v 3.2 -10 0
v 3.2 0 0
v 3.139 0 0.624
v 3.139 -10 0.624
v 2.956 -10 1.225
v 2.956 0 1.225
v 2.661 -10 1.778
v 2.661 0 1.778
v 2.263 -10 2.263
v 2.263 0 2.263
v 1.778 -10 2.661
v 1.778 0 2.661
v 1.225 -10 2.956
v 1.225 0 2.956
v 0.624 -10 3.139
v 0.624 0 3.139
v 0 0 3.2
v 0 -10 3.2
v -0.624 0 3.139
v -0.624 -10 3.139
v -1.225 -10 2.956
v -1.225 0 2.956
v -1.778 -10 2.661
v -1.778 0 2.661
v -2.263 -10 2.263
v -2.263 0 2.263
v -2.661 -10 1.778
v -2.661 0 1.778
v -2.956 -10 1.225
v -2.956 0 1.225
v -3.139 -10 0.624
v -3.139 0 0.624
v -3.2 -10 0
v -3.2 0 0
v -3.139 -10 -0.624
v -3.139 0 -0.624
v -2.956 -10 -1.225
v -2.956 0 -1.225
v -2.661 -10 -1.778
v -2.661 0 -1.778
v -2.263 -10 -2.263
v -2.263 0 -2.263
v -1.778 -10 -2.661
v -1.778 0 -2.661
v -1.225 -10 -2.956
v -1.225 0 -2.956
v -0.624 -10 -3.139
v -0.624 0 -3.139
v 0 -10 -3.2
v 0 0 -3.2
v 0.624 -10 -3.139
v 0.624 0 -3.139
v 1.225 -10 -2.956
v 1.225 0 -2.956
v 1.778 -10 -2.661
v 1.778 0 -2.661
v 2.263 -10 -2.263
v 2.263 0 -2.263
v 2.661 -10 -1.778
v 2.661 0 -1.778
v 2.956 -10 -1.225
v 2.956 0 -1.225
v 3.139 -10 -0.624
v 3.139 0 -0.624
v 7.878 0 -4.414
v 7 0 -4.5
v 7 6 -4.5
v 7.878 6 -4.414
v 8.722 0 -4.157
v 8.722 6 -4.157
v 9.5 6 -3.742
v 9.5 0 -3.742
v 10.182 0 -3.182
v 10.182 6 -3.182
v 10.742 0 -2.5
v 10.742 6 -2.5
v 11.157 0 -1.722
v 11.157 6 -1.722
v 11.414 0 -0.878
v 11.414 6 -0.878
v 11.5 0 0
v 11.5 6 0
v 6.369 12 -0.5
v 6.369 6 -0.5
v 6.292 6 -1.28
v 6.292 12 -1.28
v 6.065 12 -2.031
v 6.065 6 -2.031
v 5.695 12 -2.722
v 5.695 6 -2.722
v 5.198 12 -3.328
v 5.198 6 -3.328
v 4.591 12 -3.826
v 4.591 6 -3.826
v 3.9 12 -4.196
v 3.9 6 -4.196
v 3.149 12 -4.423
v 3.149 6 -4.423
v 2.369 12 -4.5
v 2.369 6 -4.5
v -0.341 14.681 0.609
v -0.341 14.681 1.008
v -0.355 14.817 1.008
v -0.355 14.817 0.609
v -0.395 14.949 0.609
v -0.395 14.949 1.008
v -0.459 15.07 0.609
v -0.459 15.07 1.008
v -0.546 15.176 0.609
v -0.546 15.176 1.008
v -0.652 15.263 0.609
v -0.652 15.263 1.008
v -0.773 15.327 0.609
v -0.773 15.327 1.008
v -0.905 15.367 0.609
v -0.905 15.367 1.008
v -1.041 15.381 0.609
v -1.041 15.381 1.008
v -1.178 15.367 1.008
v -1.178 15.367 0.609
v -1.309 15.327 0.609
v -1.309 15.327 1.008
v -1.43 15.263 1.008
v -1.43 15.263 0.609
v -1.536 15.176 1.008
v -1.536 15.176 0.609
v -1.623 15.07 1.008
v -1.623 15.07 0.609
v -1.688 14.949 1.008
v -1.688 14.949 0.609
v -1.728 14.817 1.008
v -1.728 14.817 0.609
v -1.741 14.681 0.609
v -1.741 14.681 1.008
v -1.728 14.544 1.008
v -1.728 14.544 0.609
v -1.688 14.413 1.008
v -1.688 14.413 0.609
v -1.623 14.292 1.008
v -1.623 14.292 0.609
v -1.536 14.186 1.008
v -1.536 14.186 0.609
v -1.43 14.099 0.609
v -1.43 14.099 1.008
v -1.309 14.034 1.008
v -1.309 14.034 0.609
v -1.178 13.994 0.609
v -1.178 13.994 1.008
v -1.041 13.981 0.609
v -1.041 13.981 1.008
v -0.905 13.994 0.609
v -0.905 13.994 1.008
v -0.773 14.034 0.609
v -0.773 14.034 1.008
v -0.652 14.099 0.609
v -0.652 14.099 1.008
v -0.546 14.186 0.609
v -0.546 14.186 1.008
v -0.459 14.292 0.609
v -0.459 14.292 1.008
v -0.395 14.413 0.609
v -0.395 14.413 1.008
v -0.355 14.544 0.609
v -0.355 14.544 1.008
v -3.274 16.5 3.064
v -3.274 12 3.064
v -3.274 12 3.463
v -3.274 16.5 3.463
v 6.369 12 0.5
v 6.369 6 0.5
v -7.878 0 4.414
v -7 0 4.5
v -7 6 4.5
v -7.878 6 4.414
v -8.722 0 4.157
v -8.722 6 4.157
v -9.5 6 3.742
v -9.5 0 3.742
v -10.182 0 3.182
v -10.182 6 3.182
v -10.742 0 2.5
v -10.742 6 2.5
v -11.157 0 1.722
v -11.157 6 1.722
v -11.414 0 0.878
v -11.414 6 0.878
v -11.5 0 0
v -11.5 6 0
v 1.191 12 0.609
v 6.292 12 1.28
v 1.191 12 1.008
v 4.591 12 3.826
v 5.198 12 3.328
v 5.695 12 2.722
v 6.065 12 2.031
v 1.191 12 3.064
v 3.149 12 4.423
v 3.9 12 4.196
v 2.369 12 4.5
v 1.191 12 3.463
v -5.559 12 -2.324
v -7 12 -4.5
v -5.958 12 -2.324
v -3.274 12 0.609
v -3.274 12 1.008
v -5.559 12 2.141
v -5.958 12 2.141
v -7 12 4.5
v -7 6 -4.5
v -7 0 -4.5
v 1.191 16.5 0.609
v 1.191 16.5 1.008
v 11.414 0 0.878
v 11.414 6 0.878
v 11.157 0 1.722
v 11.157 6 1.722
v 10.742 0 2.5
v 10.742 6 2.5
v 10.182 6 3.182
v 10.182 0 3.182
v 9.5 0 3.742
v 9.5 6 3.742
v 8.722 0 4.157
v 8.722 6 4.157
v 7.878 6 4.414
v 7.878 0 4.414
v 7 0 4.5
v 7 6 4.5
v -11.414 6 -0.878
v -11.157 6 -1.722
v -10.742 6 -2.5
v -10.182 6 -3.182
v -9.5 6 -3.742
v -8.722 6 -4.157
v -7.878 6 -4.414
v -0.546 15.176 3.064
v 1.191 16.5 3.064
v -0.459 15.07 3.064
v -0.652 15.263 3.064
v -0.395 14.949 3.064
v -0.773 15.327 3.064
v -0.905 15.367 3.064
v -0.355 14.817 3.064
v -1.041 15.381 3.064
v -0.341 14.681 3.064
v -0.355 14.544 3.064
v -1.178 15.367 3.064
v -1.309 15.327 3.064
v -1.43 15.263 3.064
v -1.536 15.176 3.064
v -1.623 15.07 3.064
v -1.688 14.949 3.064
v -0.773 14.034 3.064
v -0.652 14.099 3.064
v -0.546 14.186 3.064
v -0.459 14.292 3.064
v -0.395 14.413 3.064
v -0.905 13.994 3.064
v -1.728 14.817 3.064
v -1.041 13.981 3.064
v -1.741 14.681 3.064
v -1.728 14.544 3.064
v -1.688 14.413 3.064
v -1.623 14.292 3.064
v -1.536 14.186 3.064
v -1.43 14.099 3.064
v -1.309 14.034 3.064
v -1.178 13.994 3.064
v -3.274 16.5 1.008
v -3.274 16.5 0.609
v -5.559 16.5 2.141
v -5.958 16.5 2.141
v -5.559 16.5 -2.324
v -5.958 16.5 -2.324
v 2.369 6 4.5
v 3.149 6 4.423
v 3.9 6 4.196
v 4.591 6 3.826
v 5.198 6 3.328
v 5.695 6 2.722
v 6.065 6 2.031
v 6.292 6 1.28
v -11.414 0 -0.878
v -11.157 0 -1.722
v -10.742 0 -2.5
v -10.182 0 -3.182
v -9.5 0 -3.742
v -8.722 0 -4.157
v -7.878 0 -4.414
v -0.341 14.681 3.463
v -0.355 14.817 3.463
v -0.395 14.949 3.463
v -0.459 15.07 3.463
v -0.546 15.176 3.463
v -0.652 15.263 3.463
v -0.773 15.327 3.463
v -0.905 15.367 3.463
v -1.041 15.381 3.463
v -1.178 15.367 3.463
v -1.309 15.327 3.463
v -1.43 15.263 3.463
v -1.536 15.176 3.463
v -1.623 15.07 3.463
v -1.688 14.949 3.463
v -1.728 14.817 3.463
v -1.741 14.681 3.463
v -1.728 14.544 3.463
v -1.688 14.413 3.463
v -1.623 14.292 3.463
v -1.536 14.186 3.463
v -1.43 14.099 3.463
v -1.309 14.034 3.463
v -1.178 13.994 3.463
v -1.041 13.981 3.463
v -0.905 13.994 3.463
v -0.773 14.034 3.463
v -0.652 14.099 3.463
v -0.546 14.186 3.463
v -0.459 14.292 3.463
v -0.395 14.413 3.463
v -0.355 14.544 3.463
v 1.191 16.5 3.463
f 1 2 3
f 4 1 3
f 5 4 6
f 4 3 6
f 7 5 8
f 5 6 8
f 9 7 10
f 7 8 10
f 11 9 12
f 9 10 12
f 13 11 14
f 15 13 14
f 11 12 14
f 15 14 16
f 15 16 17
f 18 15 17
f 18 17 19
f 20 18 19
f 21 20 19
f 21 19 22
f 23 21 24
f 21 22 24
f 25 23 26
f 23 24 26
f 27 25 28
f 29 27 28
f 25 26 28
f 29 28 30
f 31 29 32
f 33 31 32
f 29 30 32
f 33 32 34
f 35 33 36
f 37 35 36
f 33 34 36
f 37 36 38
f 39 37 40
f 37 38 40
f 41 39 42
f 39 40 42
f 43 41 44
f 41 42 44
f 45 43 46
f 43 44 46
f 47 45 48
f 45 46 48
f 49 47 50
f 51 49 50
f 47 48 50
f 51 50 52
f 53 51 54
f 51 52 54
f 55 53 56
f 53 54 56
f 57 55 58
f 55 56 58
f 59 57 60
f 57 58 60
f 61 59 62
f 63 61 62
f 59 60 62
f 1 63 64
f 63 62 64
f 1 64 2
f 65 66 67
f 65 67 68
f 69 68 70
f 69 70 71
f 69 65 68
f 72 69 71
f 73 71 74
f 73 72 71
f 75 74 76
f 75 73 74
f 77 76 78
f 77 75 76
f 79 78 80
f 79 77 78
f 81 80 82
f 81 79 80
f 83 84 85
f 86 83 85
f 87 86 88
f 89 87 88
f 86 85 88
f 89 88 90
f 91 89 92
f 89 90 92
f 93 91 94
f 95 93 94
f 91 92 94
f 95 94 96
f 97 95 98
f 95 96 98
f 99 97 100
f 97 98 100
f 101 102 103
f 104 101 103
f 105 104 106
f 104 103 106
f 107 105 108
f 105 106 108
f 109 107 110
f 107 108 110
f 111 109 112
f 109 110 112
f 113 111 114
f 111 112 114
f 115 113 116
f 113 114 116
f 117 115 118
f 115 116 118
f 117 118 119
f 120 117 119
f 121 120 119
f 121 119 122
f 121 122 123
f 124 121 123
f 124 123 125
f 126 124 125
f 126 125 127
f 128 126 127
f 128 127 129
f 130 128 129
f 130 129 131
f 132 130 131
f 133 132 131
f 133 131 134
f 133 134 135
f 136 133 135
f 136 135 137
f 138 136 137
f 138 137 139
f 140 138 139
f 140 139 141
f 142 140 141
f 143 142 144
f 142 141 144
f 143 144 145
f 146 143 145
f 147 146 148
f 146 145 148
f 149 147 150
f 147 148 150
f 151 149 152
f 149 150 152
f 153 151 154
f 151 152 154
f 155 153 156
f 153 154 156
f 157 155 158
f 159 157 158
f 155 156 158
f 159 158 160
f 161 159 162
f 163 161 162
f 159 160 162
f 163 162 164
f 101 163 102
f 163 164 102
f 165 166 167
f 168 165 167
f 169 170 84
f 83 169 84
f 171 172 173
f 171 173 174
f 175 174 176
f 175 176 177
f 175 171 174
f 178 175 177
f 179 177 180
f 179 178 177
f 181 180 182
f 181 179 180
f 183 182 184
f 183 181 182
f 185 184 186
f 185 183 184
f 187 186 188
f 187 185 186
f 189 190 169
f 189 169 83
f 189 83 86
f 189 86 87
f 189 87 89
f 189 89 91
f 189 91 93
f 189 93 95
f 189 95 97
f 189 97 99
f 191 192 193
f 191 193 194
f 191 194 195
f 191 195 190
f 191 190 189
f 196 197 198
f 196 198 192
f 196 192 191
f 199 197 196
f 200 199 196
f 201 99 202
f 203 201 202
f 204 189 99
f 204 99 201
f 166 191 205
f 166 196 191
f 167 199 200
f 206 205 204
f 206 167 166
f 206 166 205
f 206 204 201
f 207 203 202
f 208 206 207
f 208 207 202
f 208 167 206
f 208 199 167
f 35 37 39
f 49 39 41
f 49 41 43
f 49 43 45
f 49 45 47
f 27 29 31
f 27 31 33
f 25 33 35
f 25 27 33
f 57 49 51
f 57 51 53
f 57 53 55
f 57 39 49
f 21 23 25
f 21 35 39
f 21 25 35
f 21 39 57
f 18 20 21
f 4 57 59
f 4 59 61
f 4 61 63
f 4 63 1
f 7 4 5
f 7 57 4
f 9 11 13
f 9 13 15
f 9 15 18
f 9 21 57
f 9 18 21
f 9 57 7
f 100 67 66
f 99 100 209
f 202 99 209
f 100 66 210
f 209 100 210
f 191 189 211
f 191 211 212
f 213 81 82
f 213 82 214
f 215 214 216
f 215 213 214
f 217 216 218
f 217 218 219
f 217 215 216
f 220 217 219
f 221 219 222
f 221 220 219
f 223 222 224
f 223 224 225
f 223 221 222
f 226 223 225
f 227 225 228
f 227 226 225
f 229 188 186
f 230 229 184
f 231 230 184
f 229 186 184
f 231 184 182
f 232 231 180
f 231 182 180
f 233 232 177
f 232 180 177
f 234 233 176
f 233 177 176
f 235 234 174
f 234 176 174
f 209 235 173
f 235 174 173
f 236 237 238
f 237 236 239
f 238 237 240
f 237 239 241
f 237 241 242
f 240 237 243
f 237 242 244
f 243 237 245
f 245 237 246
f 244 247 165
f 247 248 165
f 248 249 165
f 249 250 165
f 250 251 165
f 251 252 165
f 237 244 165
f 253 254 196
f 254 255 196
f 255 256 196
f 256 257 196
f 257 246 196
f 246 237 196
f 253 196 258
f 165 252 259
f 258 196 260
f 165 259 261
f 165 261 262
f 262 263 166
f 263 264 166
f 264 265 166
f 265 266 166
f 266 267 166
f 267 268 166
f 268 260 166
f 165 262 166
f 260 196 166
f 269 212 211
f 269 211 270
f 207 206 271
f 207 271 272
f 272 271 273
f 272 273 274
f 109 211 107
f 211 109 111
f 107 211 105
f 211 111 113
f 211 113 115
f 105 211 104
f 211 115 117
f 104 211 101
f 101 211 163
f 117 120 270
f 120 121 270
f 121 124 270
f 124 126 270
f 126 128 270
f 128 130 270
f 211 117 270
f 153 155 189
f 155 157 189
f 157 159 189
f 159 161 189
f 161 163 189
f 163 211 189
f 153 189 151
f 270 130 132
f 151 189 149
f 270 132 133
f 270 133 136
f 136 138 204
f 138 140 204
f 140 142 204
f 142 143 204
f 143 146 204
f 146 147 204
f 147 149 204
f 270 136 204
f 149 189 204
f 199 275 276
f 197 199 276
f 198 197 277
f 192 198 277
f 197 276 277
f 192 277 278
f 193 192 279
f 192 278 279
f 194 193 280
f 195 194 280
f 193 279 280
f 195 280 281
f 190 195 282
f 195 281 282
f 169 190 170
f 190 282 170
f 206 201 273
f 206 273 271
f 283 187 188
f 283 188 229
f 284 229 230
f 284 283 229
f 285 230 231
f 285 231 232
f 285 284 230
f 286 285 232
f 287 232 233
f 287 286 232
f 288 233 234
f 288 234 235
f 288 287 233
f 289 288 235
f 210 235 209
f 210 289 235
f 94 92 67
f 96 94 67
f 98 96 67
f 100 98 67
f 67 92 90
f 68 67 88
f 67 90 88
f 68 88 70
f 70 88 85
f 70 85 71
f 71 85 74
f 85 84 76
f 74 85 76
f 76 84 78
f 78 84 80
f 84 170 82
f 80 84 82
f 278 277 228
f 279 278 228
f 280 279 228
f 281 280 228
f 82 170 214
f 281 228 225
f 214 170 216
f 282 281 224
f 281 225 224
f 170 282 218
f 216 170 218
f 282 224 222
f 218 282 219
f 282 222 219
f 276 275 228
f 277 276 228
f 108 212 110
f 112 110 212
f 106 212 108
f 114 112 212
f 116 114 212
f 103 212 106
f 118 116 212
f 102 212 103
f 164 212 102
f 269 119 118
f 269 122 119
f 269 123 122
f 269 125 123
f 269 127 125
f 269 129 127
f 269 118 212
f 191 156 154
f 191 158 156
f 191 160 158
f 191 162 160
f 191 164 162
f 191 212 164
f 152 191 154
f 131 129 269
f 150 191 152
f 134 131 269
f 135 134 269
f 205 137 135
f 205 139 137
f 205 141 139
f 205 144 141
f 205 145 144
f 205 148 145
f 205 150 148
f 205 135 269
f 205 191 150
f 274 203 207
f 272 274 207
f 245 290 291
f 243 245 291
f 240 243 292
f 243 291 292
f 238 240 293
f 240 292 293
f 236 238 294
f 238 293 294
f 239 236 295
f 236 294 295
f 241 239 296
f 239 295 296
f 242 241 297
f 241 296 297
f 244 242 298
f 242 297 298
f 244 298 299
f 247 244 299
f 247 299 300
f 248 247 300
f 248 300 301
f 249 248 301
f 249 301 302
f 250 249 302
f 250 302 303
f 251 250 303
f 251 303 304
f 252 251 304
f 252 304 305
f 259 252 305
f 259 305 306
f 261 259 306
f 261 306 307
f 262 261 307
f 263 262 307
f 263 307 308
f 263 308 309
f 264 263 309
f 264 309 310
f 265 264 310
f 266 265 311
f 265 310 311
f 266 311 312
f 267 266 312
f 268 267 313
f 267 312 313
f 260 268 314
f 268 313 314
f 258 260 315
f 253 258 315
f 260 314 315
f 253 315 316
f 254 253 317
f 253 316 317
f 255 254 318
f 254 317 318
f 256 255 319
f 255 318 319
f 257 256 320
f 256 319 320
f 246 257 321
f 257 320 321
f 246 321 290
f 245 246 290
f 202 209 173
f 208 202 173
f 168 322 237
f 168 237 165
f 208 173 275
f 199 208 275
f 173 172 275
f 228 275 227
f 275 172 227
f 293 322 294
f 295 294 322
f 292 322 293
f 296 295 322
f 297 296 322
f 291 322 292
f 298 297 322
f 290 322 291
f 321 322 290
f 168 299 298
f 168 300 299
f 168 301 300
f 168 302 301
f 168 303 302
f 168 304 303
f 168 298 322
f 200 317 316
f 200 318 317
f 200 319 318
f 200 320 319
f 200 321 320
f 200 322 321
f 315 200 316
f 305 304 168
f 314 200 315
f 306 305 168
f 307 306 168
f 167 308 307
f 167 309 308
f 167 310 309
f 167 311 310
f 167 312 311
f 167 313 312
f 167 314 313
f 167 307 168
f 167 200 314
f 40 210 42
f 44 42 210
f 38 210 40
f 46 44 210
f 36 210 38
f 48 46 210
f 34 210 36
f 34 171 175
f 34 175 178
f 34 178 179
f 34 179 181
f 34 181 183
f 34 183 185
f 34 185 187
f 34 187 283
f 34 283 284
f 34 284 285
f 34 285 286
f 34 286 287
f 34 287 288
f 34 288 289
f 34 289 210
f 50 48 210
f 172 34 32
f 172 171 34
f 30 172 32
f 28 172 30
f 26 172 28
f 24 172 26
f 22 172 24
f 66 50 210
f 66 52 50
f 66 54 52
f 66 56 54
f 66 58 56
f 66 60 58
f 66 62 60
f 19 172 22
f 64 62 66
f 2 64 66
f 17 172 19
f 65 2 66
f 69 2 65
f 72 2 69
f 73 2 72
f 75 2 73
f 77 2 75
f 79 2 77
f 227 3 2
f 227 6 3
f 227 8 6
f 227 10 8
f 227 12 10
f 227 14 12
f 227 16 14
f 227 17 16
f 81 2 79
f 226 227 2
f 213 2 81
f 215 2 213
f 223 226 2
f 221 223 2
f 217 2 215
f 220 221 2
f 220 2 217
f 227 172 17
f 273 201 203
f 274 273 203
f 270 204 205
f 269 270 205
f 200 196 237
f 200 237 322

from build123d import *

# Parameters (mm, degrees)
F0_R     = 0.8
F0_R_2   = 3.2
F0_R_3   = 1
F1_DEPTH = 6
F3_DEPTH = 6
F4_W     = 4.4655336533
F4_H     = 0.3993565915
F4_W_2   = 0.3993565915
F4_H_2   = 4.4655336533
F5_DEPTH = 4.5
F6_R     = 0.7
F7_DEPTH = 5
F8_DEPTH = 10


with BuildPart() as f1:
    # F0 (on Front) → F1 (new body)
    with BuildSketch(Plane.XZ):
        with BuildLine():
            Line((-7, -4.5), (7, -4.5))
            ThreePointArc((7, -4.5), (10.1819805153, -3.1819805153), (11.5, 0))
            ThreePointArc((11.5, 0), (10.1819805153, 3.1819805153), (7, 4.5))
            Line((7, 4.5), (-7, 4.5))
            ThreePointArc((-7, 4.5), (-10.1819805153, 3.1819805153), (-11.5, 0))
            ThreePointArc((-11.5, 0), (-10.1819805153, -3.1819805153), (-7, -4.5))
        make_face()
        with Locations((-9, 0)):
            Circle(F0_R, mode=Mode.SUBTRACT)
        Circle(F0_R_2, mode=Mode.SUBTRACT)
        with Locations((9, 0)):
            Circle(F0_R, mode=Mode.SUBTRACT)
        Circle(F0_R_2)
        Circle(F0_R_3, mode=Mode.SUBTRACT)
        Circle(F0_R_3)
        with Locations((9, 0)):
            Circle(F0_R)
        with Locations((-9, 0)):
            Circle(F0_R)
    extrude(amount=-F1_DEPTH)

    # F2 (on face) → F3 (join)
    with BuildSketch(Plane(origin=(0, 6, 0), x_dir=(-1, 0, 0), z_dir=(0, 1, 0))):
        with BuildLine():
            Line((7, 4.5), (-2.3691008836, 4.5))
            ThreePointArc((-2.3691008836, 4.5), (-5.1975280083, 3.3284271247), (-6.3691008836, 0.5))
            Line((-6.3691008836, 0.5), (-6.3691008836, -0.5))
            ThreePointArc((-6.3691008836, -0.5), (-5.1975280083, -3.3284271247), (-2.3691008836, -4.5))
            Line((-2.3691008836, -4.5), (7, -4.5))
            Line((7, -4.5), (7, 4.5))
        make_face()
    extrude(amount=F3_DEPTH)

    # F4 (on face) → F5 (join)
    with BuildSketch(Plane(origin=(0, 12, 0), x_dir=(-1, 0, 0), z_dir=(0, 1, 0))):
        with Locations((1.0412741685, 3.2637477852)):
            Rectangle(F4_W, F4_H)
        with Locations((1.0412741685, 0.8087011712)):
            Rectangle(F4_W, F4_H)
        with Locations((5.7582546142, -0.0916777644)):
            Rectangle(F4_W_2, F4_H_2)
    extrude(amount=F5_DEPTH)

    # F6 (on face) → F7 (cut)
    with BuildSketch(Plane.XY.offset(3.463426081)):
        with Locations((-1.0412741685, 14.6806975827)):
            Circle(F6_R)
    extrude(amount=-F7_DEPTH, mode=Mode.SUBTRACT)

    # F0 (on Front) → F8 (join)
    with BuildSketch(Plane.XZ):
        Circle(F0_R_2)
        Circle(F0_R_3, mode=Mode.SUBTRACT)
        Circle(F0_R_3)
    extrude(amount=F8_DEPTH)


solid = f1.part
